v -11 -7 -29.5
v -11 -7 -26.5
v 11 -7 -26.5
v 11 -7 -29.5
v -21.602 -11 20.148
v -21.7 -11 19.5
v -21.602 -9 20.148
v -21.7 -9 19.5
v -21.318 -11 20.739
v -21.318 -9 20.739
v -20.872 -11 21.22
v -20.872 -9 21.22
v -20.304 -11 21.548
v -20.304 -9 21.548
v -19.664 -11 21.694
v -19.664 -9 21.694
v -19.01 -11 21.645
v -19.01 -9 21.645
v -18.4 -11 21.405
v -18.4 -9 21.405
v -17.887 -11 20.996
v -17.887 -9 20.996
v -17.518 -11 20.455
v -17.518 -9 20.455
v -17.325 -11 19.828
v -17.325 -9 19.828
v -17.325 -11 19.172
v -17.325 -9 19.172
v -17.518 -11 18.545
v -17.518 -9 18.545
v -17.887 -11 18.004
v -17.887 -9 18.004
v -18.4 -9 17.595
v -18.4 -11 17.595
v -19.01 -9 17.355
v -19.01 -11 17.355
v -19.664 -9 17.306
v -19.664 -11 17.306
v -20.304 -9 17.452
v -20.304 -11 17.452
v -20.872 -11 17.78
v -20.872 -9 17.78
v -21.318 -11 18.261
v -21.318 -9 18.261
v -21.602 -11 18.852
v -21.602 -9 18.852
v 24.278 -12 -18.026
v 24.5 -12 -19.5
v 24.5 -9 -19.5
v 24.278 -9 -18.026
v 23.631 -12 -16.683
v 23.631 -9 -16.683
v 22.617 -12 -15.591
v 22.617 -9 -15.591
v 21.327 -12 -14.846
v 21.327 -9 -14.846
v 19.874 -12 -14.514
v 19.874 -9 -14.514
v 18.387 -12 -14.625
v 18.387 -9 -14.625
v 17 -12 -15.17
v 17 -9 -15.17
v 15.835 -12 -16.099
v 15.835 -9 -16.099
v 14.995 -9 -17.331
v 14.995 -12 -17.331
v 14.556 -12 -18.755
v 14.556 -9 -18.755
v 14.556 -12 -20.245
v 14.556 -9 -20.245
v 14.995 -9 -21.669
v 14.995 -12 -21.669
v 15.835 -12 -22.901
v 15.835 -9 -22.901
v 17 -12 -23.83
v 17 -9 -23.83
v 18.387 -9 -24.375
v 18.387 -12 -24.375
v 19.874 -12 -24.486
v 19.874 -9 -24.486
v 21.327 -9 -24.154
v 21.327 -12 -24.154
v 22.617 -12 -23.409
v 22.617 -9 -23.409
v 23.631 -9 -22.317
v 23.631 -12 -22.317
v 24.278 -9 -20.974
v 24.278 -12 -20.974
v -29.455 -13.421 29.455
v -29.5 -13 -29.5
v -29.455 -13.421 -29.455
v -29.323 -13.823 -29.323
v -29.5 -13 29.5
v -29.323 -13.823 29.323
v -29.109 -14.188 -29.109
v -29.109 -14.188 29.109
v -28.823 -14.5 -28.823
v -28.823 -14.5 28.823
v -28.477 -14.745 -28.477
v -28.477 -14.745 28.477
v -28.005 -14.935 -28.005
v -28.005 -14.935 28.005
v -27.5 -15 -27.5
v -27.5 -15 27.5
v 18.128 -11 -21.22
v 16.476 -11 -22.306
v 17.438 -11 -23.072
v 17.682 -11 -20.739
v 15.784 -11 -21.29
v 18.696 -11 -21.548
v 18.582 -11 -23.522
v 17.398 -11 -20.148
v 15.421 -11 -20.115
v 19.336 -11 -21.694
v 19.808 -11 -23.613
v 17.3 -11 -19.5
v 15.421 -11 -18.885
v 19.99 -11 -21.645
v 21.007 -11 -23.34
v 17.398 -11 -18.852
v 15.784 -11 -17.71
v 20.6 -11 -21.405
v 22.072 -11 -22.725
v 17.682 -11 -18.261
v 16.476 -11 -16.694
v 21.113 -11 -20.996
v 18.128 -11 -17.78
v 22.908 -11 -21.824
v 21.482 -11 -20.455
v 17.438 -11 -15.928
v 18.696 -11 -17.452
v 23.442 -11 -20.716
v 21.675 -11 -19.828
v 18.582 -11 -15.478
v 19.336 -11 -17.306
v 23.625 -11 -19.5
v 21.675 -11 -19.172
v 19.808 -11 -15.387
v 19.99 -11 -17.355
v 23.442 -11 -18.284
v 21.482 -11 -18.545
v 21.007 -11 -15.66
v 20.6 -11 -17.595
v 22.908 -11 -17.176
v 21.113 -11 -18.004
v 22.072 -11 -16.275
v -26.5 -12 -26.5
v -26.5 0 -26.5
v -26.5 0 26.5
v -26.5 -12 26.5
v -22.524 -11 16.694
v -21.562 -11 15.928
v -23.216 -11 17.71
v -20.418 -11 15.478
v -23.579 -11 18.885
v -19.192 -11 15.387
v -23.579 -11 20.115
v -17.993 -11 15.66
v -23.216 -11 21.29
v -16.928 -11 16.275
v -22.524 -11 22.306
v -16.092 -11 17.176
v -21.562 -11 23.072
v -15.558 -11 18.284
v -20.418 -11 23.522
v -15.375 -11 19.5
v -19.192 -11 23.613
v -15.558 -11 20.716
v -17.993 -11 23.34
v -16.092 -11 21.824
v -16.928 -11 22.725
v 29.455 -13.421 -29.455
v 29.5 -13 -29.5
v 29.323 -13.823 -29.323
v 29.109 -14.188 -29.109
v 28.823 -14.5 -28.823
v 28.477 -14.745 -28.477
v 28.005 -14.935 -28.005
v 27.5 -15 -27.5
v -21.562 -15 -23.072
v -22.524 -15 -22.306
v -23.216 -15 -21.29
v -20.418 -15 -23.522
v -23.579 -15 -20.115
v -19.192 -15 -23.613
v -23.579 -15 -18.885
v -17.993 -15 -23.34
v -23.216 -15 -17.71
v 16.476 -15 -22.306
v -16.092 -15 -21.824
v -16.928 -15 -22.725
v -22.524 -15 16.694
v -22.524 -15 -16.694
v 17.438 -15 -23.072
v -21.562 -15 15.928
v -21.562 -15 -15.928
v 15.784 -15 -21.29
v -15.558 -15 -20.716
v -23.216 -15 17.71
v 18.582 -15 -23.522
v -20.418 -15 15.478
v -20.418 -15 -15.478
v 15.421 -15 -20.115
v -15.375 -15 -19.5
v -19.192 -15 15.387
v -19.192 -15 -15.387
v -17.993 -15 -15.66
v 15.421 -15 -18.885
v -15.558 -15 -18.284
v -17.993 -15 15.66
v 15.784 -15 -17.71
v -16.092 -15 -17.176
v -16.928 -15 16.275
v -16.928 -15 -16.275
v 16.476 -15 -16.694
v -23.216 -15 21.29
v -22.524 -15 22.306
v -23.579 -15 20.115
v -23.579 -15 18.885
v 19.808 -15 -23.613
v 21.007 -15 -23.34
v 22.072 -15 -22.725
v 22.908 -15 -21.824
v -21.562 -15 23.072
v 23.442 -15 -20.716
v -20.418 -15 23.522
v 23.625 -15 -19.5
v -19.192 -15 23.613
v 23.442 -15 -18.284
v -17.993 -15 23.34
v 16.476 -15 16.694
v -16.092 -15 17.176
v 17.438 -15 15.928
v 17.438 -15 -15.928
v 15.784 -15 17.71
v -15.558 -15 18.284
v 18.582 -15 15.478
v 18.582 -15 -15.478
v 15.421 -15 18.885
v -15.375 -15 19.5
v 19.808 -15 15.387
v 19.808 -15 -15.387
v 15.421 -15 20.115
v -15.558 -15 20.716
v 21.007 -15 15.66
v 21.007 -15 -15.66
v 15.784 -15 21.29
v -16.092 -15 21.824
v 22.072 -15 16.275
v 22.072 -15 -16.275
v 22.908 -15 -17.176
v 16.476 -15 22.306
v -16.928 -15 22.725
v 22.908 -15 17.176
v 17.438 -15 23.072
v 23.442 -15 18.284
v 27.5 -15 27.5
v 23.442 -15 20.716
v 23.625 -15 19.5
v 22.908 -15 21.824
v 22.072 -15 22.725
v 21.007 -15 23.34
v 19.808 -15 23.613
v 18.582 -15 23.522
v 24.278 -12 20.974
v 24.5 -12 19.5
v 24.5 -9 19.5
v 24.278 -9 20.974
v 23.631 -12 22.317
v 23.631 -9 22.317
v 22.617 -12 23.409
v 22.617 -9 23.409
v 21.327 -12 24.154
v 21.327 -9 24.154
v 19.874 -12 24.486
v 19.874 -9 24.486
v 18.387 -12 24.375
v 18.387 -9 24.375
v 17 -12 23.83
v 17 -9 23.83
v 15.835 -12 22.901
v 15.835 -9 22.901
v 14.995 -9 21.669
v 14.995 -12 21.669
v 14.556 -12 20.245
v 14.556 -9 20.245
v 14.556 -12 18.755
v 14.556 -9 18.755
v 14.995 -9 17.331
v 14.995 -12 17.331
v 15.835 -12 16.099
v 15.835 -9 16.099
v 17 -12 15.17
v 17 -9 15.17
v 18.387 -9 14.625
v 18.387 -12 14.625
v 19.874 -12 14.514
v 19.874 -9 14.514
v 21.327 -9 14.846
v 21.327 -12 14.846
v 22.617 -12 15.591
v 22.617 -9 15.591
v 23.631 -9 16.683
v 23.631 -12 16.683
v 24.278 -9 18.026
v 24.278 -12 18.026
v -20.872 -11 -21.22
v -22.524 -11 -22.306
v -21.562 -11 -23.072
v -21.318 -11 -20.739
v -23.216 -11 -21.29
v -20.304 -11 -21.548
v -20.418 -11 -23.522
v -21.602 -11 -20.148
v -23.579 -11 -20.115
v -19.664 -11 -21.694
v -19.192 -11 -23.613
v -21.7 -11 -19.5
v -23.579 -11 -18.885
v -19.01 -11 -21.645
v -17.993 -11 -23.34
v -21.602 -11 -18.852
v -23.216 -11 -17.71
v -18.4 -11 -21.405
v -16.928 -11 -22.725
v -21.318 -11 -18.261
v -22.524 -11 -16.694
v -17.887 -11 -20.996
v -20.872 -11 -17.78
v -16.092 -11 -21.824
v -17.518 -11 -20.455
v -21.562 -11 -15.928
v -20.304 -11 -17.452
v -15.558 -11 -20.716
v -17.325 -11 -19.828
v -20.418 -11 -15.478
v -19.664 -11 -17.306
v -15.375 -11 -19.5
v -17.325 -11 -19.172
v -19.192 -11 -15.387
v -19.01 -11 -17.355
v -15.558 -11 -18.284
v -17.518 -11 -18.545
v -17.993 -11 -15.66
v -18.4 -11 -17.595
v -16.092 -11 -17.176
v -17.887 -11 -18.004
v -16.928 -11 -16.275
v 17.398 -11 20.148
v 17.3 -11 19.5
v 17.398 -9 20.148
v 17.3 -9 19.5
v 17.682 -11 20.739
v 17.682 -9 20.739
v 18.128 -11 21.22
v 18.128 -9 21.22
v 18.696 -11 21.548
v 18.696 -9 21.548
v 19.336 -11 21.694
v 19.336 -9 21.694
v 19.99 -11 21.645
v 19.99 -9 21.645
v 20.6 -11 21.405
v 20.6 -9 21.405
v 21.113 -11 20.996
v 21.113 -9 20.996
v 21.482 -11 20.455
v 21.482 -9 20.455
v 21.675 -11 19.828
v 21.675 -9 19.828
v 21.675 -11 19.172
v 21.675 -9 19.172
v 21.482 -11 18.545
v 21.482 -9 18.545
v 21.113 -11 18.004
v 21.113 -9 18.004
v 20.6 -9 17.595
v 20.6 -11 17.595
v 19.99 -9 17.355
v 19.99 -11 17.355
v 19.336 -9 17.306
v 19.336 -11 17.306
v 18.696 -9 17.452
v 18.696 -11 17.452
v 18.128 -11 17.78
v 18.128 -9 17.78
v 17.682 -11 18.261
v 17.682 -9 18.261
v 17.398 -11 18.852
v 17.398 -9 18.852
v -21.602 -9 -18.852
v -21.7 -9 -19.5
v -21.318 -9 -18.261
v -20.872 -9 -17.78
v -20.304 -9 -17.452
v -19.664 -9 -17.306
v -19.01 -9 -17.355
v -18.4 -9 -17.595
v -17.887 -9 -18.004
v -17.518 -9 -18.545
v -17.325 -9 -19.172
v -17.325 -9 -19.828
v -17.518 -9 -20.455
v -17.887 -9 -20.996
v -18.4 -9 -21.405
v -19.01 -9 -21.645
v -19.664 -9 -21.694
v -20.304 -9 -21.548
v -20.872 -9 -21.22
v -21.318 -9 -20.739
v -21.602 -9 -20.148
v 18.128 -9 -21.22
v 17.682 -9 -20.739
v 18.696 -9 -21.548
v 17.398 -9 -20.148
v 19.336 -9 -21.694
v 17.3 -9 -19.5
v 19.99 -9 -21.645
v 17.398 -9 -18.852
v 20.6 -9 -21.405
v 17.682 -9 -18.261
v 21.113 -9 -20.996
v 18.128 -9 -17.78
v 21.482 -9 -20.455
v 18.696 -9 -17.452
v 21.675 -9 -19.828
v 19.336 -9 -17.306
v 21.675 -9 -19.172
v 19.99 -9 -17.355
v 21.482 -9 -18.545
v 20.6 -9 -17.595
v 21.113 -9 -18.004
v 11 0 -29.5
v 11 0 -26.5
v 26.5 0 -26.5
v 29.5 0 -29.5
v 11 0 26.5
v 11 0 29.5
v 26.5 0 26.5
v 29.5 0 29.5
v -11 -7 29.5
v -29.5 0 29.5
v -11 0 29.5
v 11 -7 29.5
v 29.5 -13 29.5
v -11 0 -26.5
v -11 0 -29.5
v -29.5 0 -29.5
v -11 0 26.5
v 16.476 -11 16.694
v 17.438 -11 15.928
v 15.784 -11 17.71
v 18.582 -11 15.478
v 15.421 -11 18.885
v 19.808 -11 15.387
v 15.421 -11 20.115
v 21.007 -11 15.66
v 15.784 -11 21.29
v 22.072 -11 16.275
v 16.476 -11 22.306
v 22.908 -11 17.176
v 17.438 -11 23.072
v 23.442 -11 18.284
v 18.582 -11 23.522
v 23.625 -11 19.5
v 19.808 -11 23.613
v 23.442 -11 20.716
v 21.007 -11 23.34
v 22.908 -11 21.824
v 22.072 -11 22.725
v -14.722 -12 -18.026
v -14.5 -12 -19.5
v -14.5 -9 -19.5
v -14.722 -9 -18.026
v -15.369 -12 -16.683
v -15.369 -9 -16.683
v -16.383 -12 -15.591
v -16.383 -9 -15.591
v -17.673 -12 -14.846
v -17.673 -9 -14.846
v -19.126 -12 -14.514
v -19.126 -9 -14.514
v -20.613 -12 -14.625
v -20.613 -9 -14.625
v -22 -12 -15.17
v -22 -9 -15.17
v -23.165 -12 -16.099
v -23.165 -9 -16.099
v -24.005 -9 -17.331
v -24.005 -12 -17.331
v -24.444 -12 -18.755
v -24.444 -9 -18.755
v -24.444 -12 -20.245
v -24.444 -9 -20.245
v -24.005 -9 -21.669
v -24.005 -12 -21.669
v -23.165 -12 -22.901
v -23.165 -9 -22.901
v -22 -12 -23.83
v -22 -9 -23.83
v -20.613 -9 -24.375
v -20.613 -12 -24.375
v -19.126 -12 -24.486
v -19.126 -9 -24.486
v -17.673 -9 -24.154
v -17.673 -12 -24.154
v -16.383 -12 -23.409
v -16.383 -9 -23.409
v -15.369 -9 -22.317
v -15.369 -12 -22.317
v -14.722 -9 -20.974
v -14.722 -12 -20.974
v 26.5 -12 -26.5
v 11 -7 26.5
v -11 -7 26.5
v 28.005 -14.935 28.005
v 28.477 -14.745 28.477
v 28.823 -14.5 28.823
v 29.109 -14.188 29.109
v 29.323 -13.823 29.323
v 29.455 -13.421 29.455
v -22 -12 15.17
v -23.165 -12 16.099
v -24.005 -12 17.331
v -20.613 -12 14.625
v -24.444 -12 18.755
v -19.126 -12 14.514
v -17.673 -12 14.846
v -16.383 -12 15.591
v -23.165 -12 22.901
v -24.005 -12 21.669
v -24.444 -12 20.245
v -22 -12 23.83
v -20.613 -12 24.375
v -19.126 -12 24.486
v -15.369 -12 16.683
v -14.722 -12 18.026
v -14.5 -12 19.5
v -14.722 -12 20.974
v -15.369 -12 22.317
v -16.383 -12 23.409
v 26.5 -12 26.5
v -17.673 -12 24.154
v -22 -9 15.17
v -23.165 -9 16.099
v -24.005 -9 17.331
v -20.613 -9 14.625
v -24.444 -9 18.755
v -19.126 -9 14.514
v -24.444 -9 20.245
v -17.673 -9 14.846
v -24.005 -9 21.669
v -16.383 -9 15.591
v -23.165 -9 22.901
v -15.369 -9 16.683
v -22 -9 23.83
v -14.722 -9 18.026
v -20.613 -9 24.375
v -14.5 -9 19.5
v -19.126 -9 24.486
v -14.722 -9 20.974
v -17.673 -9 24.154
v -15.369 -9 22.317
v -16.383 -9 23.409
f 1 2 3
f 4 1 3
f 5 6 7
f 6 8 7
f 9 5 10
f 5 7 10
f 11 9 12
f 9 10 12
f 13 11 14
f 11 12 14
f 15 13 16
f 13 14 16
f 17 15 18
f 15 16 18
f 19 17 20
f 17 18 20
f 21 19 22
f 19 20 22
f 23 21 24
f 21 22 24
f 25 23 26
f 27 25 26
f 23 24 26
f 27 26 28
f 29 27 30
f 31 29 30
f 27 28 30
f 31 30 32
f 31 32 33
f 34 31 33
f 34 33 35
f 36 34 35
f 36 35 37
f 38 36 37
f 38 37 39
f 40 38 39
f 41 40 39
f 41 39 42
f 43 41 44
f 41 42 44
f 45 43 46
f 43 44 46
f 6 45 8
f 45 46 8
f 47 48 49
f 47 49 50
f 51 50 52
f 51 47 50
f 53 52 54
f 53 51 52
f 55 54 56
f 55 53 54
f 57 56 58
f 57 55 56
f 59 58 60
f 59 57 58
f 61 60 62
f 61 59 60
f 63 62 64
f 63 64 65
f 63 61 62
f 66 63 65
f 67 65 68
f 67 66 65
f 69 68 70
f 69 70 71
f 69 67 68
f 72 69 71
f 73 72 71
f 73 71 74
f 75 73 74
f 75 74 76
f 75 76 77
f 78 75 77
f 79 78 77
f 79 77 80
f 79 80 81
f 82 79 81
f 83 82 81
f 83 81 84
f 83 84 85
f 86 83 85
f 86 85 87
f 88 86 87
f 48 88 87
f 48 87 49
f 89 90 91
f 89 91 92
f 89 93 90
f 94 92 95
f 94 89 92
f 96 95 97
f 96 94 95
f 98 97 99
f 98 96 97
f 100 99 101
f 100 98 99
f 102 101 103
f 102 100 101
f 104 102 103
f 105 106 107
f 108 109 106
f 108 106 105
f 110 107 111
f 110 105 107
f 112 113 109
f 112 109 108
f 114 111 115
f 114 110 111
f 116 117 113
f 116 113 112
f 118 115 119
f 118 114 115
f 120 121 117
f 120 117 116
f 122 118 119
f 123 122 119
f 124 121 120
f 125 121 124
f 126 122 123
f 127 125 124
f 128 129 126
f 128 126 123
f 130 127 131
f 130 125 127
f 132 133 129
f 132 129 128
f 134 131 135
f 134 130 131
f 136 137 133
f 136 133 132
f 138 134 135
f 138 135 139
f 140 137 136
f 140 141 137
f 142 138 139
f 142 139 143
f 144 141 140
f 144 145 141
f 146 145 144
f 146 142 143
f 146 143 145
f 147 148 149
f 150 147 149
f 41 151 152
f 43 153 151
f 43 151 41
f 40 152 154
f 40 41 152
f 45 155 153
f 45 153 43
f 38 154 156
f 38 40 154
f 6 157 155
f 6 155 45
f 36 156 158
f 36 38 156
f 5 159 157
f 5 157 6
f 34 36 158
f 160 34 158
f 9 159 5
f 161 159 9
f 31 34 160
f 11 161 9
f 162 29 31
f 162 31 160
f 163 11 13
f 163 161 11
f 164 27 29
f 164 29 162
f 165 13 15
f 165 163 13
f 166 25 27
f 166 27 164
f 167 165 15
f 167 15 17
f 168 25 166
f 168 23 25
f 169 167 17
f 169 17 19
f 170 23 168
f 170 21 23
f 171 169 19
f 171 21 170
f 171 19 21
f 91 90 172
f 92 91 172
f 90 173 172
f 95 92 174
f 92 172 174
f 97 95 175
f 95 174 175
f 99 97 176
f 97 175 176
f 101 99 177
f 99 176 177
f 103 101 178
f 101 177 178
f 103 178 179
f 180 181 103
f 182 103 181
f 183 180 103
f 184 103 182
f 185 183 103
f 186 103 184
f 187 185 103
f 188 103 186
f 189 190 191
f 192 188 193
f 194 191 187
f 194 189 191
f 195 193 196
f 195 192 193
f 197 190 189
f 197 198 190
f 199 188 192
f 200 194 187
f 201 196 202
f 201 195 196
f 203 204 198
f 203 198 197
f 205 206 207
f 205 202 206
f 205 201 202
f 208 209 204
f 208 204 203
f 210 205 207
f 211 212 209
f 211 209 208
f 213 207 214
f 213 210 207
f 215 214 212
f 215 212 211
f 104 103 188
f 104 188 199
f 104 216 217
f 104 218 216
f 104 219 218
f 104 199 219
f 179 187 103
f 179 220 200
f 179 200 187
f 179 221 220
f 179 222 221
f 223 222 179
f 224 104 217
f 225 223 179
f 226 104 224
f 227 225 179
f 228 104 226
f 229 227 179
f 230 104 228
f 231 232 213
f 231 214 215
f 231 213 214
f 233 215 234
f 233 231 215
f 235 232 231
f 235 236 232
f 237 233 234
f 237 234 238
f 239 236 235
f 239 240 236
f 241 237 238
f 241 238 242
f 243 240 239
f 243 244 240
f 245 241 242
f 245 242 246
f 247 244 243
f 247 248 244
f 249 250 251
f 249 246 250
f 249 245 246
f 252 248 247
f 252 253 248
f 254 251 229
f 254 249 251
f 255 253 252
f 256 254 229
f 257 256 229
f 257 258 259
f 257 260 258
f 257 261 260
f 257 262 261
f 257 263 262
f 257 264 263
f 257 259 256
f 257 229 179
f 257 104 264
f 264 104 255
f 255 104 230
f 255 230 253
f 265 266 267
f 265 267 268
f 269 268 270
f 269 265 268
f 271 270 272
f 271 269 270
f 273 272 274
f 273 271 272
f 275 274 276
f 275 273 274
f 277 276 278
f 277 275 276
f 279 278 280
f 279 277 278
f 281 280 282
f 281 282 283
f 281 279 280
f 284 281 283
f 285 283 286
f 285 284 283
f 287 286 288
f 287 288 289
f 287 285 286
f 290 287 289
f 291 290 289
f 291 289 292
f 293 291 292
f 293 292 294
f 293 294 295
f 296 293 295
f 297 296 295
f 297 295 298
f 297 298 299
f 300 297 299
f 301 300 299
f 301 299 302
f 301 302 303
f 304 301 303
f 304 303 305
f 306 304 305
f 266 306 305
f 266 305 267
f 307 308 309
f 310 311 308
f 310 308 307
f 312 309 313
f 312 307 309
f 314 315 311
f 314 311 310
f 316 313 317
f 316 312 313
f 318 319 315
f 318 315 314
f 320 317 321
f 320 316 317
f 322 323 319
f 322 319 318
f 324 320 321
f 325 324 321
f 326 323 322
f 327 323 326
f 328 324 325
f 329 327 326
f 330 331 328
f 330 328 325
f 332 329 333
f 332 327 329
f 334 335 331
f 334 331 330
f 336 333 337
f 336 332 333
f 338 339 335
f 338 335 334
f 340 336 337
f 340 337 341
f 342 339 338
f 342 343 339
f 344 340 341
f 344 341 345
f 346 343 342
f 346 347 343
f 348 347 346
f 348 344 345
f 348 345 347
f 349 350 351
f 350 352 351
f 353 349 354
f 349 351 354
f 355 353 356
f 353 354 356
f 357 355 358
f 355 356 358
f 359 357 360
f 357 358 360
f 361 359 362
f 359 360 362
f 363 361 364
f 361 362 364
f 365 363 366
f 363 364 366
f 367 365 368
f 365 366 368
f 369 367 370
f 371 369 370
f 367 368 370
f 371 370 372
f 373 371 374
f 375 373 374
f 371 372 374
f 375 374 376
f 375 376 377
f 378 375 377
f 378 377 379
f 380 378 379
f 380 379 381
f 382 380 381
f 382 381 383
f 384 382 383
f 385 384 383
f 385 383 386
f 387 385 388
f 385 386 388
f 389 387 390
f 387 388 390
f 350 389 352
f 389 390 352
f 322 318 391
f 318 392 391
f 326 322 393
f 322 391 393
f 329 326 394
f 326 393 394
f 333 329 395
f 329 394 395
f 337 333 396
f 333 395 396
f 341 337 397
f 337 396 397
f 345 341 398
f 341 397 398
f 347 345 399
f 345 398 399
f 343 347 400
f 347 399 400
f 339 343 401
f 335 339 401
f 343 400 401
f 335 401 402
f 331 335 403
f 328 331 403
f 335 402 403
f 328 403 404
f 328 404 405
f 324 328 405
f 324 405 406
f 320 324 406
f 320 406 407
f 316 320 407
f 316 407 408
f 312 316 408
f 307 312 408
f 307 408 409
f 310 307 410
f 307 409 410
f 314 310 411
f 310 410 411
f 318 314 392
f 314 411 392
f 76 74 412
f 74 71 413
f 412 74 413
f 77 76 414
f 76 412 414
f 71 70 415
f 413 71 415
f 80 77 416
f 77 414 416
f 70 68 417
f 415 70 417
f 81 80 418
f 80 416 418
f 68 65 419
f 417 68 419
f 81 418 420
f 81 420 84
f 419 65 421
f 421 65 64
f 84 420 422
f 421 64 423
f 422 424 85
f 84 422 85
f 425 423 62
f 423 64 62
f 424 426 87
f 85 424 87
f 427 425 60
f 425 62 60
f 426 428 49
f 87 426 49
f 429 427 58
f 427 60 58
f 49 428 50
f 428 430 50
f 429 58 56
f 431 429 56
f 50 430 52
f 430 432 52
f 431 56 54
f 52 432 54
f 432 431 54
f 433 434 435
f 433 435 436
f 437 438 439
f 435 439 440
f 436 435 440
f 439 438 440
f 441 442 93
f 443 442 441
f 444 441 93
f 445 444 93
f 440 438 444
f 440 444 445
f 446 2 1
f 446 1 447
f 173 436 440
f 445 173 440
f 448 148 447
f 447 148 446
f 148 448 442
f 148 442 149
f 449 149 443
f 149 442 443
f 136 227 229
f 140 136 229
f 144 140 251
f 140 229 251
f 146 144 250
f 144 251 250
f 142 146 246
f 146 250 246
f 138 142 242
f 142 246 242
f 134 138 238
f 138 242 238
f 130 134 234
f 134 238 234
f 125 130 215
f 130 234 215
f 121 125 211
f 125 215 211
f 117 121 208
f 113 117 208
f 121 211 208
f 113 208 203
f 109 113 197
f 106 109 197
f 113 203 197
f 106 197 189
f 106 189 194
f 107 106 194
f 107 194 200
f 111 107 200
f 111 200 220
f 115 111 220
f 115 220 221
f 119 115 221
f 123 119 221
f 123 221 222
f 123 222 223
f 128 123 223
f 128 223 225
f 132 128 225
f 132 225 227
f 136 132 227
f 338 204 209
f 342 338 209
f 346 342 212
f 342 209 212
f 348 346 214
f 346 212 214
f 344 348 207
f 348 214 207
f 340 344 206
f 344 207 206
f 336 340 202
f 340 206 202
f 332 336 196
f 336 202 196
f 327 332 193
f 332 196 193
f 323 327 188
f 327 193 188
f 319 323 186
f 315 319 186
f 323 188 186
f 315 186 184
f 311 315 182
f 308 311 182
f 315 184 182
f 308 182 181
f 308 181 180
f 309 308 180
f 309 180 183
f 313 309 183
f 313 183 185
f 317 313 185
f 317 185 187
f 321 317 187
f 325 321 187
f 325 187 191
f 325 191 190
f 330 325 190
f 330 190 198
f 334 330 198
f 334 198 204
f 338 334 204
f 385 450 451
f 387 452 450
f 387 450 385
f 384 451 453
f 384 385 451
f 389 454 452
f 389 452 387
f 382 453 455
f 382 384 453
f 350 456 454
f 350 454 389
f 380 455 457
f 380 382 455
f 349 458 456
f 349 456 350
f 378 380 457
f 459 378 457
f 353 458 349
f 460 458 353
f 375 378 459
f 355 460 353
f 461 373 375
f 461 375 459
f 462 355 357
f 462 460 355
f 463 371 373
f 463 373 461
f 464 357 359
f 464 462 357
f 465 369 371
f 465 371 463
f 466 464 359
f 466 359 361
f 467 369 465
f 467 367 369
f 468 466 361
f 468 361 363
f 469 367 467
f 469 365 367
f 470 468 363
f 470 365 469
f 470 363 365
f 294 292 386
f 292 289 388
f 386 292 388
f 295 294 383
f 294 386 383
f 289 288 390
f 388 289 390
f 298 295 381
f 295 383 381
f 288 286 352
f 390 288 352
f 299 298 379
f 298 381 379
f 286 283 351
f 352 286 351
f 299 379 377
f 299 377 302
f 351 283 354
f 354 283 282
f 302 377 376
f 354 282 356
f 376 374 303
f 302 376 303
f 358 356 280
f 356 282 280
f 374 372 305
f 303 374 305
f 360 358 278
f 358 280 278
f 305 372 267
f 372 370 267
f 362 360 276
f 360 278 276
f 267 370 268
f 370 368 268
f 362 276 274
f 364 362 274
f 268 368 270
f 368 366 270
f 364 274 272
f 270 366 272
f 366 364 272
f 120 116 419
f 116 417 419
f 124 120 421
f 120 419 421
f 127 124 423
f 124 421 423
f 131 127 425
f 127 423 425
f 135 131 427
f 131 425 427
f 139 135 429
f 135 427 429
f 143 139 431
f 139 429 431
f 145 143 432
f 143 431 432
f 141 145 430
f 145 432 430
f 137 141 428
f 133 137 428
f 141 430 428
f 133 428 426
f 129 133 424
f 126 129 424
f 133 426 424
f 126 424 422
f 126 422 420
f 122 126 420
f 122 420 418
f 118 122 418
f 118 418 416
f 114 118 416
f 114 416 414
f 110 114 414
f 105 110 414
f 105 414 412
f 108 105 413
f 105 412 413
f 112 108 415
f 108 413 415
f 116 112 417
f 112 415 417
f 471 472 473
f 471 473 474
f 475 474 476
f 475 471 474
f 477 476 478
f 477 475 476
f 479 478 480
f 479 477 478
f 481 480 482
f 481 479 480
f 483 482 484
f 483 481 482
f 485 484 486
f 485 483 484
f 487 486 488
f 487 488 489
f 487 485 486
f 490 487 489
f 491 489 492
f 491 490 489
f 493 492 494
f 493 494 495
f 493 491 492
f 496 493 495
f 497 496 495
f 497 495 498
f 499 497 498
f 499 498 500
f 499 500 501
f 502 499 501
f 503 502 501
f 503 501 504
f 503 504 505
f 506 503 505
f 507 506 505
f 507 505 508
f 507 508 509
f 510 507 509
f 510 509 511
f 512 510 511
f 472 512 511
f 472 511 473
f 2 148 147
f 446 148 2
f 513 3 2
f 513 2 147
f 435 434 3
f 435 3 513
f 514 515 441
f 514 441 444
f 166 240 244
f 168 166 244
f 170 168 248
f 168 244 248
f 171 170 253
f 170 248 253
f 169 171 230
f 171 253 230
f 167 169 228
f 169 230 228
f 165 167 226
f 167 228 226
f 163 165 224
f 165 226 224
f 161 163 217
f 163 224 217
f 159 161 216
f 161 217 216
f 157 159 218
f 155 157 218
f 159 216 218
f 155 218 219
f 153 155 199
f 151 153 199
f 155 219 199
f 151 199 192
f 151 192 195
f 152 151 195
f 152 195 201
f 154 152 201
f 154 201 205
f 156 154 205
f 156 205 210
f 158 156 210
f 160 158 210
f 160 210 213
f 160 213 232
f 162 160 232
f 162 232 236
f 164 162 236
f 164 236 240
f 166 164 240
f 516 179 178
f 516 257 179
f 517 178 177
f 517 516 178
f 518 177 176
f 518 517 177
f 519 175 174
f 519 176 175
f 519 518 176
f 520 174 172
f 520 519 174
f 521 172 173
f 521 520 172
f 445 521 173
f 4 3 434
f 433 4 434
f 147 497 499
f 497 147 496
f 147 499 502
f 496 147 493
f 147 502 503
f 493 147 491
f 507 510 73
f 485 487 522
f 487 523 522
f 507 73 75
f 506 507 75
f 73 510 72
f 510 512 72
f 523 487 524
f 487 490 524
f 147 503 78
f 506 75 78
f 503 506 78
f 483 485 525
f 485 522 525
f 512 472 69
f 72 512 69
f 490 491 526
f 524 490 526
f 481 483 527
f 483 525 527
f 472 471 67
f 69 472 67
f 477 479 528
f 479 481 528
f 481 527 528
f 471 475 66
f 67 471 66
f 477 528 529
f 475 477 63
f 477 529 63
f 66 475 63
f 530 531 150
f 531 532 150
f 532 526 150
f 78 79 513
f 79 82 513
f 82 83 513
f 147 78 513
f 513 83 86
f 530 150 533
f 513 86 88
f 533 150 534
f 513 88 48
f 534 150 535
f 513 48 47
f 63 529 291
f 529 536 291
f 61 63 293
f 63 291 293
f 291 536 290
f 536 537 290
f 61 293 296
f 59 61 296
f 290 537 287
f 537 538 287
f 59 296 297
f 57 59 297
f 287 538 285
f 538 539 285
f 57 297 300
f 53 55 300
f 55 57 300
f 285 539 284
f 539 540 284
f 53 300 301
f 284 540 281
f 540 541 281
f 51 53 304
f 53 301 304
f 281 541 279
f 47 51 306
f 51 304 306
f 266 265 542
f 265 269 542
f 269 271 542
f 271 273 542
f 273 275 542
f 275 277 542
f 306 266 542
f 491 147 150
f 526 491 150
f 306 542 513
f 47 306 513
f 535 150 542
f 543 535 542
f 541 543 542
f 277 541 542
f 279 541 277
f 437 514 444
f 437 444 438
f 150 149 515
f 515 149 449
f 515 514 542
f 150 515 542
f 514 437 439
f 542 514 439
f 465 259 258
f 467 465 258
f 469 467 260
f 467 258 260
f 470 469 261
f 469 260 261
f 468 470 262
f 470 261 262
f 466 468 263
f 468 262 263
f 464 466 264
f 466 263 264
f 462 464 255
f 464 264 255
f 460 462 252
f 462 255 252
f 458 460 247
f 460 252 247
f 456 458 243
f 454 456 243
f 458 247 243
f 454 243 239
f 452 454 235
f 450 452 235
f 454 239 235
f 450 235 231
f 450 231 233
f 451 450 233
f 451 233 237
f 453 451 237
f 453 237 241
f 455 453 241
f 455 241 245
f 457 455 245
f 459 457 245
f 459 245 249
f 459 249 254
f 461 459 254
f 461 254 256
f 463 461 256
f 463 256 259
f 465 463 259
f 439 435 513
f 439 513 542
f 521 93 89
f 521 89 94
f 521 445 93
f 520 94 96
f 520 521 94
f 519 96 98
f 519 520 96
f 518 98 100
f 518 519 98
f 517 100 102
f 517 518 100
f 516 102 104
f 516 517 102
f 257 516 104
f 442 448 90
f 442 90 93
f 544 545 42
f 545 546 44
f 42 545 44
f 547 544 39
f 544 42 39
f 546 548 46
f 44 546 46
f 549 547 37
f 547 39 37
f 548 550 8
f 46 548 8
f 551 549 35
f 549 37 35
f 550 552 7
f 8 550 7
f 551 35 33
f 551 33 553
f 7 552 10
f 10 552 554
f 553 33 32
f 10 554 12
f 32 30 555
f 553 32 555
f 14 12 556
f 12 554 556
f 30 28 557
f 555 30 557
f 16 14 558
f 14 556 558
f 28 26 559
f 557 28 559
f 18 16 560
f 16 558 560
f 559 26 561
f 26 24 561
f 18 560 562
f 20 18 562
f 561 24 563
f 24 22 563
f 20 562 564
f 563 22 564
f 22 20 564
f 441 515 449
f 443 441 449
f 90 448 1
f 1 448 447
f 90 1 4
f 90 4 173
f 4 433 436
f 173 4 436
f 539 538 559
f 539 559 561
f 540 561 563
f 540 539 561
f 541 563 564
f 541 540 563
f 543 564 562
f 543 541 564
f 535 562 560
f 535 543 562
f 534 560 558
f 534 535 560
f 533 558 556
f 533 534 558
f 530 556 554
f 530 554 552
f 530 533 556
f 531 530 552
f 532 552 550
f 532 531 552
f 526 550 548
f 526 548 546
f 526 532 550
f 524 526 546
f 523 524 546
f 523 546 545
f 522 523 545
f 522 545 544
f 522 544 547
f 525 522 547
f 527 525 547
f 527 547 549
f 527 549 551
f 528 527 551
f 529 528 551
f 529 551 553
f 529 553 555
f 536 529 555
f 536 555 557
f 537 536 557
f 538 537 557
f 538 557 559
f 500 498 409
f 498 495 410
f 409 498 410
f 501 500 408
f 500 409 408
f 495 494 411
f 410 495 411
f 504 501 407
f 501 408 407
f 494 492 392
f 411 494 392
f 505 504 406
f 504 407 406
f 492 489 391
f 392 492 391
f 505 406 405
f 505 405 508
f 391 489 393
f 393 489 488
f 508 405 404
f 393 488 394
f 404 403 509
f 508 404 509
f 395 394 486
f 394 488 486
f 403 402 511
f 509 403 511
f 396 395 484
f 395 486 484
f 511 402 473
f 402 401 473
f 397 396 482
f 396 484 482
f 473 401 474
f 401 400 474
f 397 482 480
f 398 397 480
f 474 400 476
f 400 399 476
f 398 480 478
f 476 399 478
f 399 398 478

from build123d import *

# Parameters (mm, degrees)
F0_W            = 59
F0_H            = 59
F3_DEPTH        = 15
F1_W            = 53
F1_H            = 53
F4_DEPTH        = 12
F2_W            = 22
F2_H            = 14
F5_DEPTH        = 30
F5_DEPTH_BACK   = 30
F6_R            = 2
F8_R            = 5
F9_DEPTH        = 6
F11_D           = 4.4
F11_CBORE_D     = 8.25
F11_CBORE_DEPTH = 4
F12_D           = 4.4
F12_CBORE_D     = 8.25
F12_CBORE_DEPTH = 4
F13_D           = 4.4
F13_CBORE_D     = 8.25
F13_CBORE_DEPTH = 4
F14_D           = 4.4
F14_CBORE_D     = 8.25
F14_CBORE_DEPTH = 4


with BuildPart() as f3:
    # F0 (on Front) → F3 (new body)
    with BuildSketch(Plane.XZ):
        Rectangle(F0_W, F0_H)
    extrude(amount=F3_DEPTH)

    # F1 (on Front) → F4 (cut)
    with BuildSketch(Plane.XZ):
        Rectangle(F1_W, F1_H)
    extrude(amount=F4_DEPTH, mode=Mode.SUBTRACT)

    # F2 (on Top) → F5 (cut, two sides)
    with BuildSketch(Plane.XY) as f5_sk:
        Rectangle(F2_W, F2_H)
    extrude(amount=-F5_DEPTH, mode=Mode.SUBTRACT)
    extrude(f5_sk.sketch, amount=F5_DEPTH_BACK, mode=Mode.SUBTRACT)

    # F6
    f6_edges = [f3.edges().sort_by_distance(p)[0] for p in [
        (0, -15, 29.5),
        (-29.5, -15, 0),
        (0, -15, -29.5),
        (29.5, -15, 0),
    ]]
    fillet(f6_edges, radius=F6_R)

    # F8 (on offset) → F9 (join)
    with BuildSketch(Plane.XZ.offset(15)):
        with Locations((19.5, 19.5)):
            Circle(F8_R)
        with Locations((-19.5, 19.5)):
            Circle(F8_R)
        with Locations((19.5, -19.5)):
            Circle(F8_R)
        with Locations((-19.5, -19.5)):
            Circle(F8_R)
    extrude(amount=-F9_DEPTH)

    # F11 (through all)
    with Locations(Plane.XZ.offset(15)):
        with Locations((-19.5, 19.5)):
            CounterBoreHole(F11_D / 2, F11_CBORE_D / 2, F11_CBORE_DEPTH)

    # F12 (through all)
    with Locations(Plane.XZ.offset(15)):
        with Locations((-19.5, -19.5)):
            CounterBoreHole(F12_D / 2, F12_CBORE_D / 2, F12_CBORE_DEPTH)

    # F13 (through all)
    with Locations(Plane.XZ.offset(15)):
        with Locations((19.5, -19.5)):
            CounterBoreHole(F13_D / 2, F13_CBORE_D / 2, F13_CBORE_DEPTH)

    # F14 (through all)
    with Locations(Plane.XZ.offset(15)):
        with Locations((19.5, 19.5)):
            CounterBoreHole(F14_D / 2, F14_CBORE_D / 2, F14_CBORE_DEPTH)


solid = f3.part
